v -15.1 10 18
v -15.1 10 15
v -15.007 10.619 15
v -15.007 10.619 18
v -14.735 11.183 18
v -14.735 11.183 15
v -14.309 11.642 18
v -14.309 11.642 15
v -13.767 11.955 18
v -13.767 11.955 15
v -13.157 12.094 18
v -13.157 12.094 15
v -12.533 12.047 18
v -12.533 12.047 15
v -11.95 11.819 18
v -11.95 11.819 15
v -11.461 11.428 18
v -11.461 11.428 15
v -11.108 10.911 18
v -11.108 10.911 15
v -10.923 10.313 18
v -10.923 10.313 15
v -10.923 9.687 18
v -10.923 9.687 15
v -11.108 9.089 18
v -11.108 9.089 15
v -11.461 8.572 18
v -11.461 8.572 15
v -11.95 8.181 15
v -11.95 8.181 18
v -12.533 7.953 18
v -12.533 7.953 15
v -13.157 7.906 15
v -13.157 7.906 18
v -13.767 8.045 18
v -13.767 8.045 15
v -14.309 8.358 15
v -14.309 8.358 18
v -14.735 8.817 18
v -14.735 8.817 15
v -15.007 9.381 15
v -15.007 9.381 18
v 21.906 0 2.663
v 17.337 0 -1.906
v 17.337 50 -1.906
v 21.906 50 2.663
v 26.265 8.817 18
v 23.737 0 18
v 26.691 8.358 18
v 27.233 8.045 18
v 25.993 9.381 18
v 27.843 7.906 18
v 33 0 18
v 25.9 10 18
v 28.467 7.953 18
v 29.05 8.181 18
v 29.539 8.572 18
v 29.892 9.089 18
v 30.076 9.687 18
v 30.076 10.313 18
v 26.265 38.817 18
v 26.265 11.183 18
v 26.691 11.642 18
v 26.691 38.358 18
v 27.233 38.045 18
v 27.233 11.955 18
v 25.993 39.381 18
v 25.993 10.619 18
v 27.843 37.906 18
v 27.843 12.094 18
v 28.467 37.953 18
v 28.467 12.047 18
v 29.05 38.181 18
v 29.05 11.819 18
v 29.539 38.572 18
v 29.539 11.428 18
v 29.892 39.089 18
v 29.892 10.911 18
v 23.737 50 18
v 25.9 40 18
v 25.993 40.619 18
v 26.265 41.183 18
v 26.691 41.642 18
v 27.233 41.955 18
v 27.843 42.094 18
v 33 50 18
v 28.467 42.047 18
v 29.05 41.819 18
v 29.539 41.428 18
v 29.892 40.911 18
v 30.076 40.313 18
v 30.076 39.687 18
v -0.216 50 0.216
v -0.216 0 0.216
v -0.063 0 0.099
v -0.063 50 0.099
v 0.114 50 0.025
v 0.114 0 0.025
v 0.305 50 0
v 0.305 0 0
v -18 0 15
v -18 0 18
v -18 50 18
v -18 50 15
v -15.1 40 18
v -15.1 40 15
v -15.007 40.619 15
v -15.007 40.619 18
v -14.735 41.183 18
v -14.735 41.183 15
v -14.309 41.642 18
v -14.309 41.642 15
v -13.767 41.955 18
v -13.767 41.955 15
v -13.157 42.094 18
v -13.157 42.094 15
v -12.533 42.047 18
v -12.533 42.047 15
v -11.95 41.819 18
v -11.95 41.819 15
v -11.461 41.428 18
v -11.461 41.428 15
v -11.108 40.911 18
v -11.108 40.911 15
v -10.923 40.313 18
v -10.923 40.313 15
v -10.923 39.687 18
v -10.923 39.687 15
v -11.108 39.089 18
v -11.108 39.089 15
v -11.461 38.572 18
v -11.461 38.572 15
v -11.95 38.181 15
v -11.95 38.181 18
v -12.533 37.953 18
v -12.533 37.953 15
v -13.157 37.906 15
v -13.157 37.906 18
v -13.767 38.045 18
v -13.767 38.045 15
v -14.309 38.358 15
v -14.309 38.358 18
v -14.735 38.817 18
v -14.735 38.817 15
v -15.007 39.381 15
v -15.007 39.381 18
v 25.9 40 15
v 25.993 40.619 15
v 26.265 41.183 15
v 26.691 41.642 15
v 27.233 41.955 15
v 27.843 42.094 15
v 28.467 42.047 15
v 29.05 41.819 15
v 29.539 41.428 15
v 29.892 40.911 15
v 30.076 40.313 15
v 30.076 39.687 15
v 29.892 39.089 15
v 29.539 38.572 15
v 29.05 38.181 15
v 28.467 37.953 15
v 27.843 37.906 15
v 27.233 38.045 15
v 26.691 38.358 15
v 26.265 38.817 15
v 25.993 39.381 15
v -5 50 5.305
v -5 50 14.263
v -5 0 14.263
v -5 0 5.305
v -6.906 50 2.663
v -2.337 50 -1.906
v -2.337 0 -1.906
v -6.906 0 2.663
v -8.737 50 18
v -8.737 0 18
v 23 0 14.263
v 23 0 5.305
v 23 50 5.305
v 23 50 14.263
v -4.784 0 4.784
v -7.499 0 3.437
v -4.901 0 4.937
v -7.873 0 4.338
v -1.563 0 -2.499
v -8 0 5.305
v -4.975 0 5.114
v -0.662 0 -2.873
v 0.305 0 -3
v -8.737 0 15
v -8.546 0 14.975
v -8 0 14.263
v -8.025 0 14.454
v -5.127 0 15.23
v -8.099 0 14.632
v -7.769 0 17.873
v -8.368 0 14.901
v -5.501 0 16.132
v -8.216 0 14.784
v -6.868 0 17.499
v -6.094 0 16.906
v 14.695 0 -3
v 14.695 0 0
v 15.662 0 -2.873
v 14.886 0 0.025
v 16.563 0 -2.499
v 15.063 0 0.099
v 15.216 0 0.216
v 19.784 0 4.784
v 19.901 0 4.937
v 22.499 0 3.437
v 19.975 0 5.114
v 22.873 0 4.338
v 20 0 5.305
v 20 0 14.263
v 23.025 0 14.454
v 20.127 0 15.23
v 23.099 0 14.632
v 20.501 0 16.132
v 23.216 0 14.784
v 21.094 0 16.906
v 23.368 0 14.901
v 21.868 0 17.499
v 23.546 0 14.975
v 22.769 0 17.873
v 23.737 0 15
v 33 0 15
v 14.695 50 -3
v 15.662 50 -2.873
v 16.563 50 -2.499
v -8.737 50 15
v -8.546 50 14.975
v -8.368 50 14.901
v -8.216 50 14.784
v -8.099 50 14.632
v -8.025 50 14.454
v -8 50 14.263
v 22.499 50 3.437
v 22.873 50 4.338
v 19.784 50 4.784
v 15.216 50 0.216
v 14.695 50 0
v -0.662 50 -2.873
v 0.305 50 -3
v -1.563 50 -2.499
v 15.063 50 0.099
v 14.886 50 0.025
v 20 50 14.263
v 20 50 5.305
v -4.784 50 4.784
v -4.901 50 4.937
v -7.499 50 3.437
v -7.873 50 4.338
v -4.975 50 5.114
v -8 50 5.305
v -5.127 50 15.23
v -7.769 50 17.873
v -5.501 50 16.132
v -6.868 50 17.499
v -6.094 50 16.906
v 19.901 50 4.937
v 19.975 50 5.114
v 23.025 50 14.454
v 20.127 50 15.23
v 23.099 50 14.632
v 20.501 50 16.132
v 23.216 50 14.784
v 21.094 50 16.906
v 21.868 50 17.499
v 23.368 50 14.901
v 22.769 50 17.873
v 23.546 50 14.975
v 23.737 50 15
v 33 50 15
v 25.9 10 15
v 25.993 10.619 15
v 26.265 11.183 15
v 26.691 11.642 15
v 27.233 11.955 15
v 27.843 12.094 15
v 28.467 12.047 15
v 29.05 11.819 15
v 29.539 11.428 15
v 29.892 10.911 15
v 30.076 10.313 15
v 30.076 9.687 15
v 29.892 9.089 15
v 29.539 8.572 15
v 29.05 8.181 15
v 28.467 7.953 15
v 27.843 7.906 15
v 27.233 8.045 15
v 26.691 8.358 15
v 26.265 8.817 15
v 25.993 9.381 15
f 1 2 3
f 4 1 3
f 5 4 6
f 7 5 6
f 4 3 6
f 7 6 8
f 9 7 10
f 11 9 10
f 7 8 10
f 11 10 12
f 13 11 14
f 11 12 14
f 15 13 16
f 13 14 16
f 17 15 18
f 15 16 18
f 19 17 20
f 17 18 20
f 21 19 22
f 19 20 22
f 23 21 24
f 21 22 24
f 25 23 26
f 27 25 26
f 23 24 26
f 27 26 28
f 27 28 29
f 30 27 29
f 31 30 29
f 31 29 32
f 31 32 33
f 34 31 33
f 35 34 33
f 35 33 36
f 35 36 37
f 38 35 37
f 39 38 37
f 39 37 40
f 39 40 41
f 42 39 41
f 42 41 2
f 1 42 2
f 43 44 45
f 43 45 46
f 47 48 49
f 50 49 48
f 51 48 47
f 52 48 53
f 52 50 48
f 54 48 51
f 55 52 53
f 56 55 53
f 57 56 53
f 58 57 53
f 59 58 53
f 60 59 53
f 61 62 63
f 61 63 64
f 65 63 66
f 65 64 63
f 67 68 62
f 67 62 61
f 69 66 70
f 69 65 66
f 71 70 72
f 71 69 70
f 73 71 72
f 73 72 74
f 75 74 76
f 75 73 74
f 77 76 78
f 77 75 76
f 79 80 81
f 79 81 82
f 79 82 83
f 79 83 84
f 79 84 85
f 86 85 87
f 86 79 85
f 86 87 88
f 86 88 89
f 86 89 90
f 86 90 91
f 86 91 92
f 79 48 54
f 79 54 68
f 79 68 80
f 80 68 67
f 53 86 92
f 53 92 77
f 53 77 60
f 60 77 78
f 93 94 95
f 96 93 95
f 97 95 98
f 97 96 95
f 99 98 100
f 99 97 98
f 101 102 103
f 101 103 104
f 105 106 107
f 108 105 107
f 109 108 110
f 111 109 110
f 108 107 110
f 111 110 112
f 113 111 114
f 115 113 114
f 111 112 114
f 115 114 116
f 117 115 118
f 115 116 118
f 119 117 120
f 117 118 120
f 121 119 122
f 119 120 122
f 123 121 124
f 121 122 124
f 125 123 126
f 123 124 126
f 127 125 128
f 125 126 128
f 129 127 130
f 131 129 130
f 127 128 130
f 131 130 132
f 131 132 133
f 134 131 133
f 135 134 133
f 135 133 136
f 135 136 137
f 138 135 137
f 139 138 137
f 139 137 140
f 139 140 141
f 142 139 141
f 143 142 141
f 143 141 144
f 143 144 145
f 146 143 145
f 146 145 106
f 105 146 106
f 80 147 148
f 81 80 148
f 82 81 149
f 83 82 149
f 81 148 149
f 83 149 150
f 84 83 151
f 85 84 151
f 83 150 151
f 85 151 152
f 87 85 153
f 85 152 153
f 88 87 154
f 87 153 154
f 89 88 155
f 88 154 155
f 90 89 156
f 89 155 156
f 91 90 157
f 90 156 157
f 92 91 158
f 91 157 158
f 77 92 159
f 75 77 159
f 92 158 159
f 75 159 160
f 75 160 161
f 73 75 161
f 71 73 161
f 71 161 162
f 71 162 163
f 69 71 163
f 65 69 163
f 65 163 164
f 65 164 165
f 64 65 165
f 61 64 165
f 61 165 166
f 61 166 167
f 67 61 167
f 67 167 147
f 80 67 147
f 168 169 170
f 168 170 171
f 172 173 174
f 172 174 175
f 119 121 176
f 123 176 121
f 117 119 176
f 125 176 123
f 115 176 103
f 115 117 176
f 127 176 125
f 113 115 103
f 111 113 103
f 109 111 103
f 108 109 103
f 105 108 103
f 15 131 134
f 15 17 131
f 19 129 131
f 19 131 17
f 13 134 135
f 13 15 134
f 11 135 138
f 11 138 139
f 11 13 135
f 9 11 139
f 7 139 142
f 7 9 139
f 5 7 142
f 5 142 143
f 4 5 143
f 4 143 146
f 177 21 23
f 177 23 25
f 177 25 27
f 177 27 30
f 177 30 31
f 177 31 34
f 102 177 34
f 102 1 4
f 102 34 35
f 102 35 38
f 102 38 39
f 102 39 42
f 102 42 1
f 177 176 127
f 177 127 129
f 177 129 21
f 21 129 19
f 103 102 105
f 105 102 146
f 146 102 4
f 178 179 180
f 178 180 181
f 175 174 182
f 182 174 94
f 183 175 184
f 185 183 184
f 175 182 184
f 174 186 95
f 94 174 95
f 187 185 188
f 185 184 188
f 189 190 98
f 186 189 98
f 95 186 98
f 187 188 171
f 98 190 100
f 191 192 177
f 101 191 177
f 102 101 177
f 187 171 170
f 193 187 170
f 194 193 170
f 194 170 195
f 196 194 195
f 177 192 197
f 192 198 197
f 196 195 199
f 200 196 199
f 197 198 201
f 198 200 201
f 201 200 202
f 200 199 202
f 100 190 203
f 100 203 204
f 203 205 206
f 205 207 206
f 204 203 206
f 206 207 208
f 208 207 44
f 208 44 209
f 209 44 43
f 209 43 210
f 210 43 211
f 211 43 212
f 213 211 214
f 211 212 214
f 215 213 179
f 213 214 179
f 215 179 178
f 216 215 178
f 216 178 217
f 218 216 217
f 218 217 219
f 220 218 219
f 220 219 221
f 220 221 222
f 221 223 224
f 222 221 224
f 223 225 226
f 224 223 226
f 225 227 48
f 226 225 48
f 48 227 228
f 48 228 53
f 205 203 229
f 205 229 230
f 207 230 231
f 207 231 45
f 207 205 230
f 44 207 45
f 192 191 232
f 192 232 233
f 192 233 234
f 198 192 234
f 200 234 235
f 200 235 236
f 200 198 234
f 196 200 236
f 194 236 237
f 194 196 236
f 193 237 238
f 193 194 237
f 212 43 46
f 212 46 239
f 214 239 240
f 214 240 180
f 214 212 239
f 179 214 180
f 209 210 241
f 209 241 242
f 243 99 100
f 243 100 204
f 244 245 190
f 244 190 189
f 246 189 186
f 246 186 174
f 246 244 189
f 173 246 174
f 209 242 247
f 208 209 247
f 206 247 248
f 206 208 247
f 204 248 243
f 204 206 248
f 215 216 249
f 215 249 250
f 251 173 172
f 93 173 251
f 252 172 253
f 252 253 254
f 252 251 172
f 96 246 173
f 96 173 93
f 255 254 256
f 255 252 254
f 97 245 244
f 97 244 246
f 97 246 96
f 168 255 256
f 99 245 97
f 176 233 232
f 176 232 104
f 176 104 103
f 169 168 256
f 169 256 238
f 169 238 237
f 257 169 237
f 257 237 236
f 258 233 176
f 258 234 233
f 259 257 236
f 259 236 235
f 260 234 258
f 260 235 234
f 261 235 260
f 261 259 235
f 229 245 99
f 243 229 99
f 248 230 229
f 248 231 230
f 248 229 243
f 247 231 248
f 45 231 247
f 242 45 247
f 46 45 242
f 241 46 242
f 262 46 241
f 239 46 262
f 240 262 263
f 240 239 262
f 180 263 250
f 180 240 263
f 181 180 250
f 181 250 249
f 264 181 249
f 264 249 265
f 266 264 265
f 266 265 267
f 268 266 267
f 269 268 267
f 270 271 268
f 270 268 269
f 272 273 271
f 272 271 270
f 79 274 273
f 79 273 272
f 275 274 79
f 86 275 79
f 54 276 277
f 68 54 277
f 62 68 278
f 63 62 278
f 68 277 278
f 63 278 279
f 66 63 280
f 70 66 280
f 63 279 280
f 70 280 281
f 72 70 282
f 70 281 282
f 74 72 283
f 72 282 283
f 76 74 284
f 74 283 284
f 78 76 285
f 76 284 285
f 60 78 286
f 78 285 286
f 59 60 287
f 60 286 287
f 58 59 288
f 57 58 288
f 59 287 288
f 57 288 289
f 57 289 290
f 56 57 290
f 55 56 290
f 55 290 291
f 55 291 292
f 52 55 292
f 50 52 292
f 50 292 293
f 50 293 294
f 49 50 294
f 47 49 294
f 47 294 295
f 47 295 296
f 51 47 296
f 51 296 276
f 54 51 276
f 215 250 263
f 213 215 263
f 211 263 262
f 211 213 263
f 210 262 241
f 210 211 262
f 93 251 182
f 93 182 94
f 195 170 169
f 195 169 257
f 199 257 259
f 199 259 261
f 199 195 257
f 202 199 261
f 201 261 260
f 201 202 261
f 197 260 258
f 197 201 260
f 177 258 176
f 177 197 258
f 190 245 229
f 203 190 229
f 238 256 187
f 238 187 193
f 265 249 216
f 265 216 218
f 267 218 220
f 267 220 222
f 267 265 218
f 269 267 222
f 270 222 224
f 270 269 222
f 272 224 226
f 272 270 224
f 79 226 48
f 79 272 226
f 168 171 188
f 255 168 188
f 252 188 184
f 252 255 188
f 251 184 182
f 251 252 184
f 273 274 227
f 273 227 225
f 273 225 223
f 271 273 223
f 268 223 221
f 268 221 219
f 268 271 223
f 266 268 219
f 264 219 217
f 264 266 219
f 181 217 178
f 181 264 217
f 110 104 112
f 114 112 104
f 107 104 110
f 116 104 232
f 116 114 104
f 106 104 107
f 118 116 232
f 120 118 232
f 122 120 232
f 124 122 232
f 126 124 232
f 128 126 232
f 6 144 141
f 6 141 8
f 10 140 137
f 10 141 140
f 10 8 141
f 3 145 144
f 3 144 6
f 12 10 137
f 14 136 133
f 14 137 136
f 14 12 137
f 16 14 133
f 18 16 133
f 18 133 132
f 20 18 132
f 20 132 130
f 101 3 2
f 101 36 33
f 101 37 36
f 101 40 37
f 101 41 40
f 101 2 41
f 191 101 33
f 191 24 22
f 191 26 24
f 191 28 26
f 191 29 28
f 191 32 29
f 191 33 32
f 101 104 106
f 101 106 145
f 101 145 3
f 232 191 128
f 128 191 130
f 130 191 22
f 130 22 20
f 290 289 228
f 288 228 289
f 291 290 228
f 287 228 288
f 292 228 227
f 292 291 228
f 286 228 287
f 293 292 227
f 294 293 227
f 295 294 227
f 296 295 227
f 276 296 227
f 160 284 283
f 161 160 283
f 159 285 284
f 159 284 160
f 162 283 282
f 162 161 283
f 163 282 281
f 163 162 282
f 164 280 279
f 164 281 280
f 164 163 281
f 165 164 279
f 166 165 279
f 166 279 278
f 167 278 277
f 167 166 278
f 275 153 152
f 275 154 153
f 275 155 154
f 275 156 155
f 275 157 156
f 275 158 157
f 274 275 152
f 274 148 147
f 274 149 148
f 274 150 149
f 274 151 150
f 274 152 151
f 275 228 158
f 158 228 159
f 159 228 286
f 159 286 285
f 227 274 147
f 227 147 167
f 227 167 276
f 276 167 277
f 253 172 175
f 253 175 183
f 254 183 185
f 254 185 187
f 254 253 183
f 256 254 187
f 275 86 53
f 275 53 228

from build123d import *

# Parameters (mm, degrees)
SKETCH1_W                      = 15
SKETCH1_H                      = 50
BASE_FLANGE1_DEPTH             = 3
EDGE_FLANGE5_STRIP_CUT_DEPTH   = 50
EDGE_FLANGE5_STRIP_CUT_2_DEPTH = 50
EDGE_FLANGE5_DEPTH             = 50
EDGE_FLANGE5_BEND_DEPTH        = 50
EDGE_FLANGE6_STRIP_CUT_DEPTH   = 50
EDGE_FLANGE6_STRIP_CUT_2_DEPTH = 50
EDGE_FLANGE6_DEPTH             = 50
EDGE_FLANGE6_BEND_DEPTH        = 50
EDGE_FLANGE7_STRIP_W           = 13.4732
EDGE_FLANGE7_STRIP_H           = 3
EDGE_FLANGE7_STRIP_CUT_DEPTH   = 50
EDGE_FLANGE7_STRIP_2_W         = 13.4732
EDGE_FLANGE7_STRIP_2_H         = 3
EDGE_FLANGE7_STRIP_CUT_2_DEPTH = 50
EDGE_FLANGE7_DEPTH             = 50
EDGE_FLANGE7_BEND_DEPTH        = 50
TAP_DRILL_FOR_M5X0_8_TAP1_D    = 4.2


# Sheet-metal steps are written as plain solids
with BuildPart() as part:
    # Sketch1 → Base-Flange1 (new body)
    with BuildSketch(Plane.XY):
        with Locations((7.5, 25)):
            Rectangle(SKETCH1_W, SKETCH1_H)
    extrude(amount=-BASE_FLANGE1_DEPTH)

    # Edge-Flange5 strip (across the edge) → Edge-Flange5 strip cut (cut)
    with BuildSketch(Plane(origin=(15, 0, 0), x_dir=(-0.7071067811865438, 0, 0.7071067811865512), z_dir=(0, 1, 0))):
        Polygon((-11.432566283, 7.189925596), (-1.905575199, -2.337065489), (0.215745145, -0.215745145), (-9.311245939, 9.311245939), align=None)
    extrude(amount=EDGE_FLANGE5_STRIP_CUT_DEPTH, mode=Mode.SUBTRACT)

    # Edge-Flange5 strip 2 (across the edge) → Edge-Flange5 strip cut 2 (cut)
    with BuildSketch(Plane(origin=(0, 50, 0), x_dir=(0.7071067811865438, 0, 0.7071067811865512), z_dir=(0, -1, 0))):
        Polygon((-11.432566283, 7.189925596), (-1.905575199, -2.337065489), (0.215745145, -0.215745145), (-9.311245939, 9.311245939), align=None)
    extrude(amount=EDGE_FLANGE5_STRIP_CUT_2_DEPTH, mode=Mode.SUBTRACT)

    # Edge-Flange5 section (across the edge) → Edge-Flange5 (add)
    with BuildSketch(Plane(origin=(15, 0, 0), x_dir=(-0.7071067811865438, 0, 0.7071067811865512), z_dir=(0, 1, 0))):
        with BuildLine():
            Line((-3, 0.30510971), (-3, 7.071))
            Line((-3, 7.071), (0, 7.071))
            Line((0, 7.071), (0, 0.30510971))
            ThreePointArc((0, 0.30510971), (0.056070336, 0.023225094), (0.215745145, -0.215745145))
            Line((0.215745145, -0.215745145), (-1.905575199, -2.337065489))
            ThreePointArc((-1.905575199, -2.337065489), (-2.715568261, -1.124825203), (-3, 0.30510971))
        make_face()
    extrude(amount=EDGE_FLANGE5_DEPTH)

    # Edge-Flange5 section 2 (across the edge) → Edge-Flange5 bend (add)
    with BuildSketch(Plane(origin=(0, 50, 0), x_dir=(0.7071067811865438, 0, 0.7071067811865512), z_dir=(0, -1, 0))):
        with BuildLine():
            Line((-3, 0.30510971), (-3, 7.071))
            Line((-3, 7.071), (0, 7.071))
            Line((0, 7.071), (0, 0.30510971))
            ThreePointArc((0, 0.30510971), (0.056070336, 0.023225094), (0.215745145, -0.215745145))
            Line((0.215745145, -0.215745145), (-1.905575199, -2.337065489))
            ThreePointArc((-1.905575199, -2.337065489), (-2.715568261, -1.124825203), (-3, 0.30510971))
        make_face()
    extrude(amount=EDGE_FLANGE5_BEND_DEPTH)

    # Edge-Flange6 strip (across the edge) → Edge-Flange6 strip cut (cut)
    with BuildSketch(Plane(origin=(-4.99995205, 50, 4.99995205), x_dir=(1, 0, 0), z_dir=(0, -1, 0))):
        Polygon((-11.432566283, 7.189925596), (-1.905575199, -2.337065489), (0.215745145, -0.215745145), (-9.311245939, 9.311245939), align=None)
    extrude(amount=EDGE_FLANGE6_STRIP_CUT_DEPTH, mode=Mode.SUBTRACT)

    # Edge-Flange6 strip 2 (across the edge) → Edge-Flange6 strip cut 2 (cut)
    with BuildSketch(Plane(origin=(19.99995205, 0, 4.99995205), x_dir=(-1, 0, 0), z_dir=(0, 1, 0))):
        Polygon((-11.432566283, 7.189925596), (-1.905575199, -2.337065489), (0.215745145, -0.215745145), (-9.311245939, 9.311245939), align=None)
    extrude(amount=EDGE_FLANGE6_STRIP_CUT_2_DEPTH, mode=Mode.SUBTRACT)

    # Edge-Flange6 section (across the edge) → Edge-Flange6 (add)
    with BuildSketch(Plane(origin=(-4.99995205, 50, 4.99995205), x_dir=(1, 0, 0), z_dir=(0, -1, 0))):
        with BuildLine():
            Line((-3, 0.30510971), (-3, 10))
            Line((-3, 10), (0, 10))
            Line((0, 10), (0, 0.30510971))
            ThreePointArc((0, 0.30510971), (0.056070336, 0.023225094), (0.215745145, -0.215745145))
            Line((0.215745145, -0.215745145), (-1.905575199, -2.337065489))
            ThreePointArc((-1.905575199, -2.337065489), (-2.715568261, -1.124825203), (-3, 0.30510971))
        make_face()
    extrude(amount=EDGE_FLANGE6_DEPTH)

    # Edge-Flange6 section 2 (across the edge) → Edge-Flange6 bend (add)
    with BuildSketch(Plane(origin=(19.99995205, 0, 4.99995205), x_dir=(-1, 0, 0), z_dir=(0, 1, 0))):
        with BuildLine():
            Line((-3, 0.30510971), (-3, 10))
            Line((-3, 10), (0, 10))
            Line((0, 10), (0, 0.30510971))
            ThreePointArc((0, 0.30510971), (0.056070336, 0.023225094), (0.215745145, -0.215745145))
            Line((0.215745145, -0.215745145), (-1.905575199, -2.337065489))
            ThreePointArc((-1.905575199, -2.337065489), (-2.715568261, -1.124825203), (-3, 0.30510971))
        make_face()
    extrude(amount=EDGE_FLANGE6_BEND_DEPTH)

    # Edge-Flange7 strip (across the edge) → Edge-Flange7 strip cut (cut)
    with BuildSketch(Plane(origin=(-7.99995205, 0, 14.99995205), x_dir=(0, 0, -1), z_dir=(0, 1, 0))):
        with Locations((-6, -1.5)):
            Rectangle(EDGE_FLANGE7_STRIP_W, EDGE_FLANGE7_STRIP_H)
    extrude(amount=EDGE_FLANGE7_STRIP_CUT_DEPTH, mode=Mode.SUBTRACT)

    # Edge-Flange7 strip 2 (across the edge) → Edge-Flange7 strip cut 2 (cut)
    with BuildSketch(Plane(origin=(22.99995205, 50, 14.99995205), x_dir=(0, 0, -1), z_dir=(0, -1, 0))):
        with Locations((-6, -1.5)):
            Rectangle(EDGE_FLANGE7_STRIP_2_W, EDGE_FLANGE7_STRIP_2_H)
    extrude(amount=EDGE_FLANGE7_STRIP_CUT_2_DEPTH, mode=Mode.SUBTRACT)

    # Edge-Flange7 section (across the edge) → Edge-Flange7 (add)
    with BuildSketch(Plane(origin=(-7.99995205, 0, 14.99995205), x_dir=(0, 0, -1), z_dir=(0, 1, 0))):
        with BuildLine():
            Line((-3, 0.7366), (-3, 10))
            Line((-3, 10), (0, 10))
            Line((0, 10), (0, 0.7366))
            ThreePointArc((0, 0.7366), (0.215745145, 0.215745145), (0.7366, 0))
            Line((0.7366, 0), (0.7366, -3))
            ThreePointArc((0.7366, -3), (-1.905575199, -1.905575199), (-3, 0.7366))
        make_face()
    extrude(amount=EDGE_FLANGE7_DEPTH)

    # Edge-Flange7 section 2 (across the edge) → Edge-Flange7 bend (add)
    with BuildSketch(Plane(origin=(22.99995205, 50, 14.99995205), x_dir=(0, 0, -1), z_dir=(0, -1, 0))):
        with BuildLine():
            Line((-3, 0.7366), (-3, 10))
            Line((-3, 10), (0, 10))
            Line((0, 10), (0, 0.7366))
            ThreePointArc((0, 0.7366), (0.215745145, 0.215745145), (0.7366, 0))
            Line((0.7366, 0), (0.7366, -3))
            ThreePointArc((0.7366, -3), (-1.905575199, -1.905575199), (-3, 0.7366))
        make_face()
    extrude(amount=EDGE_FLANGE7_BEND_DEPTH)

    # Tap Drill for M5x0.8 Tap1 (through all)
    with Locations(Plane.XY.offset(17.99995205)):
        with Locations((-12.99995205, 10), (-12.99995205, 40), (27.99995205, 10), (27.99995205, 40)):
            Hole(TAP_DRILL_FOR_M5X0_8_TAP1_D / 2)


solid = part.part
